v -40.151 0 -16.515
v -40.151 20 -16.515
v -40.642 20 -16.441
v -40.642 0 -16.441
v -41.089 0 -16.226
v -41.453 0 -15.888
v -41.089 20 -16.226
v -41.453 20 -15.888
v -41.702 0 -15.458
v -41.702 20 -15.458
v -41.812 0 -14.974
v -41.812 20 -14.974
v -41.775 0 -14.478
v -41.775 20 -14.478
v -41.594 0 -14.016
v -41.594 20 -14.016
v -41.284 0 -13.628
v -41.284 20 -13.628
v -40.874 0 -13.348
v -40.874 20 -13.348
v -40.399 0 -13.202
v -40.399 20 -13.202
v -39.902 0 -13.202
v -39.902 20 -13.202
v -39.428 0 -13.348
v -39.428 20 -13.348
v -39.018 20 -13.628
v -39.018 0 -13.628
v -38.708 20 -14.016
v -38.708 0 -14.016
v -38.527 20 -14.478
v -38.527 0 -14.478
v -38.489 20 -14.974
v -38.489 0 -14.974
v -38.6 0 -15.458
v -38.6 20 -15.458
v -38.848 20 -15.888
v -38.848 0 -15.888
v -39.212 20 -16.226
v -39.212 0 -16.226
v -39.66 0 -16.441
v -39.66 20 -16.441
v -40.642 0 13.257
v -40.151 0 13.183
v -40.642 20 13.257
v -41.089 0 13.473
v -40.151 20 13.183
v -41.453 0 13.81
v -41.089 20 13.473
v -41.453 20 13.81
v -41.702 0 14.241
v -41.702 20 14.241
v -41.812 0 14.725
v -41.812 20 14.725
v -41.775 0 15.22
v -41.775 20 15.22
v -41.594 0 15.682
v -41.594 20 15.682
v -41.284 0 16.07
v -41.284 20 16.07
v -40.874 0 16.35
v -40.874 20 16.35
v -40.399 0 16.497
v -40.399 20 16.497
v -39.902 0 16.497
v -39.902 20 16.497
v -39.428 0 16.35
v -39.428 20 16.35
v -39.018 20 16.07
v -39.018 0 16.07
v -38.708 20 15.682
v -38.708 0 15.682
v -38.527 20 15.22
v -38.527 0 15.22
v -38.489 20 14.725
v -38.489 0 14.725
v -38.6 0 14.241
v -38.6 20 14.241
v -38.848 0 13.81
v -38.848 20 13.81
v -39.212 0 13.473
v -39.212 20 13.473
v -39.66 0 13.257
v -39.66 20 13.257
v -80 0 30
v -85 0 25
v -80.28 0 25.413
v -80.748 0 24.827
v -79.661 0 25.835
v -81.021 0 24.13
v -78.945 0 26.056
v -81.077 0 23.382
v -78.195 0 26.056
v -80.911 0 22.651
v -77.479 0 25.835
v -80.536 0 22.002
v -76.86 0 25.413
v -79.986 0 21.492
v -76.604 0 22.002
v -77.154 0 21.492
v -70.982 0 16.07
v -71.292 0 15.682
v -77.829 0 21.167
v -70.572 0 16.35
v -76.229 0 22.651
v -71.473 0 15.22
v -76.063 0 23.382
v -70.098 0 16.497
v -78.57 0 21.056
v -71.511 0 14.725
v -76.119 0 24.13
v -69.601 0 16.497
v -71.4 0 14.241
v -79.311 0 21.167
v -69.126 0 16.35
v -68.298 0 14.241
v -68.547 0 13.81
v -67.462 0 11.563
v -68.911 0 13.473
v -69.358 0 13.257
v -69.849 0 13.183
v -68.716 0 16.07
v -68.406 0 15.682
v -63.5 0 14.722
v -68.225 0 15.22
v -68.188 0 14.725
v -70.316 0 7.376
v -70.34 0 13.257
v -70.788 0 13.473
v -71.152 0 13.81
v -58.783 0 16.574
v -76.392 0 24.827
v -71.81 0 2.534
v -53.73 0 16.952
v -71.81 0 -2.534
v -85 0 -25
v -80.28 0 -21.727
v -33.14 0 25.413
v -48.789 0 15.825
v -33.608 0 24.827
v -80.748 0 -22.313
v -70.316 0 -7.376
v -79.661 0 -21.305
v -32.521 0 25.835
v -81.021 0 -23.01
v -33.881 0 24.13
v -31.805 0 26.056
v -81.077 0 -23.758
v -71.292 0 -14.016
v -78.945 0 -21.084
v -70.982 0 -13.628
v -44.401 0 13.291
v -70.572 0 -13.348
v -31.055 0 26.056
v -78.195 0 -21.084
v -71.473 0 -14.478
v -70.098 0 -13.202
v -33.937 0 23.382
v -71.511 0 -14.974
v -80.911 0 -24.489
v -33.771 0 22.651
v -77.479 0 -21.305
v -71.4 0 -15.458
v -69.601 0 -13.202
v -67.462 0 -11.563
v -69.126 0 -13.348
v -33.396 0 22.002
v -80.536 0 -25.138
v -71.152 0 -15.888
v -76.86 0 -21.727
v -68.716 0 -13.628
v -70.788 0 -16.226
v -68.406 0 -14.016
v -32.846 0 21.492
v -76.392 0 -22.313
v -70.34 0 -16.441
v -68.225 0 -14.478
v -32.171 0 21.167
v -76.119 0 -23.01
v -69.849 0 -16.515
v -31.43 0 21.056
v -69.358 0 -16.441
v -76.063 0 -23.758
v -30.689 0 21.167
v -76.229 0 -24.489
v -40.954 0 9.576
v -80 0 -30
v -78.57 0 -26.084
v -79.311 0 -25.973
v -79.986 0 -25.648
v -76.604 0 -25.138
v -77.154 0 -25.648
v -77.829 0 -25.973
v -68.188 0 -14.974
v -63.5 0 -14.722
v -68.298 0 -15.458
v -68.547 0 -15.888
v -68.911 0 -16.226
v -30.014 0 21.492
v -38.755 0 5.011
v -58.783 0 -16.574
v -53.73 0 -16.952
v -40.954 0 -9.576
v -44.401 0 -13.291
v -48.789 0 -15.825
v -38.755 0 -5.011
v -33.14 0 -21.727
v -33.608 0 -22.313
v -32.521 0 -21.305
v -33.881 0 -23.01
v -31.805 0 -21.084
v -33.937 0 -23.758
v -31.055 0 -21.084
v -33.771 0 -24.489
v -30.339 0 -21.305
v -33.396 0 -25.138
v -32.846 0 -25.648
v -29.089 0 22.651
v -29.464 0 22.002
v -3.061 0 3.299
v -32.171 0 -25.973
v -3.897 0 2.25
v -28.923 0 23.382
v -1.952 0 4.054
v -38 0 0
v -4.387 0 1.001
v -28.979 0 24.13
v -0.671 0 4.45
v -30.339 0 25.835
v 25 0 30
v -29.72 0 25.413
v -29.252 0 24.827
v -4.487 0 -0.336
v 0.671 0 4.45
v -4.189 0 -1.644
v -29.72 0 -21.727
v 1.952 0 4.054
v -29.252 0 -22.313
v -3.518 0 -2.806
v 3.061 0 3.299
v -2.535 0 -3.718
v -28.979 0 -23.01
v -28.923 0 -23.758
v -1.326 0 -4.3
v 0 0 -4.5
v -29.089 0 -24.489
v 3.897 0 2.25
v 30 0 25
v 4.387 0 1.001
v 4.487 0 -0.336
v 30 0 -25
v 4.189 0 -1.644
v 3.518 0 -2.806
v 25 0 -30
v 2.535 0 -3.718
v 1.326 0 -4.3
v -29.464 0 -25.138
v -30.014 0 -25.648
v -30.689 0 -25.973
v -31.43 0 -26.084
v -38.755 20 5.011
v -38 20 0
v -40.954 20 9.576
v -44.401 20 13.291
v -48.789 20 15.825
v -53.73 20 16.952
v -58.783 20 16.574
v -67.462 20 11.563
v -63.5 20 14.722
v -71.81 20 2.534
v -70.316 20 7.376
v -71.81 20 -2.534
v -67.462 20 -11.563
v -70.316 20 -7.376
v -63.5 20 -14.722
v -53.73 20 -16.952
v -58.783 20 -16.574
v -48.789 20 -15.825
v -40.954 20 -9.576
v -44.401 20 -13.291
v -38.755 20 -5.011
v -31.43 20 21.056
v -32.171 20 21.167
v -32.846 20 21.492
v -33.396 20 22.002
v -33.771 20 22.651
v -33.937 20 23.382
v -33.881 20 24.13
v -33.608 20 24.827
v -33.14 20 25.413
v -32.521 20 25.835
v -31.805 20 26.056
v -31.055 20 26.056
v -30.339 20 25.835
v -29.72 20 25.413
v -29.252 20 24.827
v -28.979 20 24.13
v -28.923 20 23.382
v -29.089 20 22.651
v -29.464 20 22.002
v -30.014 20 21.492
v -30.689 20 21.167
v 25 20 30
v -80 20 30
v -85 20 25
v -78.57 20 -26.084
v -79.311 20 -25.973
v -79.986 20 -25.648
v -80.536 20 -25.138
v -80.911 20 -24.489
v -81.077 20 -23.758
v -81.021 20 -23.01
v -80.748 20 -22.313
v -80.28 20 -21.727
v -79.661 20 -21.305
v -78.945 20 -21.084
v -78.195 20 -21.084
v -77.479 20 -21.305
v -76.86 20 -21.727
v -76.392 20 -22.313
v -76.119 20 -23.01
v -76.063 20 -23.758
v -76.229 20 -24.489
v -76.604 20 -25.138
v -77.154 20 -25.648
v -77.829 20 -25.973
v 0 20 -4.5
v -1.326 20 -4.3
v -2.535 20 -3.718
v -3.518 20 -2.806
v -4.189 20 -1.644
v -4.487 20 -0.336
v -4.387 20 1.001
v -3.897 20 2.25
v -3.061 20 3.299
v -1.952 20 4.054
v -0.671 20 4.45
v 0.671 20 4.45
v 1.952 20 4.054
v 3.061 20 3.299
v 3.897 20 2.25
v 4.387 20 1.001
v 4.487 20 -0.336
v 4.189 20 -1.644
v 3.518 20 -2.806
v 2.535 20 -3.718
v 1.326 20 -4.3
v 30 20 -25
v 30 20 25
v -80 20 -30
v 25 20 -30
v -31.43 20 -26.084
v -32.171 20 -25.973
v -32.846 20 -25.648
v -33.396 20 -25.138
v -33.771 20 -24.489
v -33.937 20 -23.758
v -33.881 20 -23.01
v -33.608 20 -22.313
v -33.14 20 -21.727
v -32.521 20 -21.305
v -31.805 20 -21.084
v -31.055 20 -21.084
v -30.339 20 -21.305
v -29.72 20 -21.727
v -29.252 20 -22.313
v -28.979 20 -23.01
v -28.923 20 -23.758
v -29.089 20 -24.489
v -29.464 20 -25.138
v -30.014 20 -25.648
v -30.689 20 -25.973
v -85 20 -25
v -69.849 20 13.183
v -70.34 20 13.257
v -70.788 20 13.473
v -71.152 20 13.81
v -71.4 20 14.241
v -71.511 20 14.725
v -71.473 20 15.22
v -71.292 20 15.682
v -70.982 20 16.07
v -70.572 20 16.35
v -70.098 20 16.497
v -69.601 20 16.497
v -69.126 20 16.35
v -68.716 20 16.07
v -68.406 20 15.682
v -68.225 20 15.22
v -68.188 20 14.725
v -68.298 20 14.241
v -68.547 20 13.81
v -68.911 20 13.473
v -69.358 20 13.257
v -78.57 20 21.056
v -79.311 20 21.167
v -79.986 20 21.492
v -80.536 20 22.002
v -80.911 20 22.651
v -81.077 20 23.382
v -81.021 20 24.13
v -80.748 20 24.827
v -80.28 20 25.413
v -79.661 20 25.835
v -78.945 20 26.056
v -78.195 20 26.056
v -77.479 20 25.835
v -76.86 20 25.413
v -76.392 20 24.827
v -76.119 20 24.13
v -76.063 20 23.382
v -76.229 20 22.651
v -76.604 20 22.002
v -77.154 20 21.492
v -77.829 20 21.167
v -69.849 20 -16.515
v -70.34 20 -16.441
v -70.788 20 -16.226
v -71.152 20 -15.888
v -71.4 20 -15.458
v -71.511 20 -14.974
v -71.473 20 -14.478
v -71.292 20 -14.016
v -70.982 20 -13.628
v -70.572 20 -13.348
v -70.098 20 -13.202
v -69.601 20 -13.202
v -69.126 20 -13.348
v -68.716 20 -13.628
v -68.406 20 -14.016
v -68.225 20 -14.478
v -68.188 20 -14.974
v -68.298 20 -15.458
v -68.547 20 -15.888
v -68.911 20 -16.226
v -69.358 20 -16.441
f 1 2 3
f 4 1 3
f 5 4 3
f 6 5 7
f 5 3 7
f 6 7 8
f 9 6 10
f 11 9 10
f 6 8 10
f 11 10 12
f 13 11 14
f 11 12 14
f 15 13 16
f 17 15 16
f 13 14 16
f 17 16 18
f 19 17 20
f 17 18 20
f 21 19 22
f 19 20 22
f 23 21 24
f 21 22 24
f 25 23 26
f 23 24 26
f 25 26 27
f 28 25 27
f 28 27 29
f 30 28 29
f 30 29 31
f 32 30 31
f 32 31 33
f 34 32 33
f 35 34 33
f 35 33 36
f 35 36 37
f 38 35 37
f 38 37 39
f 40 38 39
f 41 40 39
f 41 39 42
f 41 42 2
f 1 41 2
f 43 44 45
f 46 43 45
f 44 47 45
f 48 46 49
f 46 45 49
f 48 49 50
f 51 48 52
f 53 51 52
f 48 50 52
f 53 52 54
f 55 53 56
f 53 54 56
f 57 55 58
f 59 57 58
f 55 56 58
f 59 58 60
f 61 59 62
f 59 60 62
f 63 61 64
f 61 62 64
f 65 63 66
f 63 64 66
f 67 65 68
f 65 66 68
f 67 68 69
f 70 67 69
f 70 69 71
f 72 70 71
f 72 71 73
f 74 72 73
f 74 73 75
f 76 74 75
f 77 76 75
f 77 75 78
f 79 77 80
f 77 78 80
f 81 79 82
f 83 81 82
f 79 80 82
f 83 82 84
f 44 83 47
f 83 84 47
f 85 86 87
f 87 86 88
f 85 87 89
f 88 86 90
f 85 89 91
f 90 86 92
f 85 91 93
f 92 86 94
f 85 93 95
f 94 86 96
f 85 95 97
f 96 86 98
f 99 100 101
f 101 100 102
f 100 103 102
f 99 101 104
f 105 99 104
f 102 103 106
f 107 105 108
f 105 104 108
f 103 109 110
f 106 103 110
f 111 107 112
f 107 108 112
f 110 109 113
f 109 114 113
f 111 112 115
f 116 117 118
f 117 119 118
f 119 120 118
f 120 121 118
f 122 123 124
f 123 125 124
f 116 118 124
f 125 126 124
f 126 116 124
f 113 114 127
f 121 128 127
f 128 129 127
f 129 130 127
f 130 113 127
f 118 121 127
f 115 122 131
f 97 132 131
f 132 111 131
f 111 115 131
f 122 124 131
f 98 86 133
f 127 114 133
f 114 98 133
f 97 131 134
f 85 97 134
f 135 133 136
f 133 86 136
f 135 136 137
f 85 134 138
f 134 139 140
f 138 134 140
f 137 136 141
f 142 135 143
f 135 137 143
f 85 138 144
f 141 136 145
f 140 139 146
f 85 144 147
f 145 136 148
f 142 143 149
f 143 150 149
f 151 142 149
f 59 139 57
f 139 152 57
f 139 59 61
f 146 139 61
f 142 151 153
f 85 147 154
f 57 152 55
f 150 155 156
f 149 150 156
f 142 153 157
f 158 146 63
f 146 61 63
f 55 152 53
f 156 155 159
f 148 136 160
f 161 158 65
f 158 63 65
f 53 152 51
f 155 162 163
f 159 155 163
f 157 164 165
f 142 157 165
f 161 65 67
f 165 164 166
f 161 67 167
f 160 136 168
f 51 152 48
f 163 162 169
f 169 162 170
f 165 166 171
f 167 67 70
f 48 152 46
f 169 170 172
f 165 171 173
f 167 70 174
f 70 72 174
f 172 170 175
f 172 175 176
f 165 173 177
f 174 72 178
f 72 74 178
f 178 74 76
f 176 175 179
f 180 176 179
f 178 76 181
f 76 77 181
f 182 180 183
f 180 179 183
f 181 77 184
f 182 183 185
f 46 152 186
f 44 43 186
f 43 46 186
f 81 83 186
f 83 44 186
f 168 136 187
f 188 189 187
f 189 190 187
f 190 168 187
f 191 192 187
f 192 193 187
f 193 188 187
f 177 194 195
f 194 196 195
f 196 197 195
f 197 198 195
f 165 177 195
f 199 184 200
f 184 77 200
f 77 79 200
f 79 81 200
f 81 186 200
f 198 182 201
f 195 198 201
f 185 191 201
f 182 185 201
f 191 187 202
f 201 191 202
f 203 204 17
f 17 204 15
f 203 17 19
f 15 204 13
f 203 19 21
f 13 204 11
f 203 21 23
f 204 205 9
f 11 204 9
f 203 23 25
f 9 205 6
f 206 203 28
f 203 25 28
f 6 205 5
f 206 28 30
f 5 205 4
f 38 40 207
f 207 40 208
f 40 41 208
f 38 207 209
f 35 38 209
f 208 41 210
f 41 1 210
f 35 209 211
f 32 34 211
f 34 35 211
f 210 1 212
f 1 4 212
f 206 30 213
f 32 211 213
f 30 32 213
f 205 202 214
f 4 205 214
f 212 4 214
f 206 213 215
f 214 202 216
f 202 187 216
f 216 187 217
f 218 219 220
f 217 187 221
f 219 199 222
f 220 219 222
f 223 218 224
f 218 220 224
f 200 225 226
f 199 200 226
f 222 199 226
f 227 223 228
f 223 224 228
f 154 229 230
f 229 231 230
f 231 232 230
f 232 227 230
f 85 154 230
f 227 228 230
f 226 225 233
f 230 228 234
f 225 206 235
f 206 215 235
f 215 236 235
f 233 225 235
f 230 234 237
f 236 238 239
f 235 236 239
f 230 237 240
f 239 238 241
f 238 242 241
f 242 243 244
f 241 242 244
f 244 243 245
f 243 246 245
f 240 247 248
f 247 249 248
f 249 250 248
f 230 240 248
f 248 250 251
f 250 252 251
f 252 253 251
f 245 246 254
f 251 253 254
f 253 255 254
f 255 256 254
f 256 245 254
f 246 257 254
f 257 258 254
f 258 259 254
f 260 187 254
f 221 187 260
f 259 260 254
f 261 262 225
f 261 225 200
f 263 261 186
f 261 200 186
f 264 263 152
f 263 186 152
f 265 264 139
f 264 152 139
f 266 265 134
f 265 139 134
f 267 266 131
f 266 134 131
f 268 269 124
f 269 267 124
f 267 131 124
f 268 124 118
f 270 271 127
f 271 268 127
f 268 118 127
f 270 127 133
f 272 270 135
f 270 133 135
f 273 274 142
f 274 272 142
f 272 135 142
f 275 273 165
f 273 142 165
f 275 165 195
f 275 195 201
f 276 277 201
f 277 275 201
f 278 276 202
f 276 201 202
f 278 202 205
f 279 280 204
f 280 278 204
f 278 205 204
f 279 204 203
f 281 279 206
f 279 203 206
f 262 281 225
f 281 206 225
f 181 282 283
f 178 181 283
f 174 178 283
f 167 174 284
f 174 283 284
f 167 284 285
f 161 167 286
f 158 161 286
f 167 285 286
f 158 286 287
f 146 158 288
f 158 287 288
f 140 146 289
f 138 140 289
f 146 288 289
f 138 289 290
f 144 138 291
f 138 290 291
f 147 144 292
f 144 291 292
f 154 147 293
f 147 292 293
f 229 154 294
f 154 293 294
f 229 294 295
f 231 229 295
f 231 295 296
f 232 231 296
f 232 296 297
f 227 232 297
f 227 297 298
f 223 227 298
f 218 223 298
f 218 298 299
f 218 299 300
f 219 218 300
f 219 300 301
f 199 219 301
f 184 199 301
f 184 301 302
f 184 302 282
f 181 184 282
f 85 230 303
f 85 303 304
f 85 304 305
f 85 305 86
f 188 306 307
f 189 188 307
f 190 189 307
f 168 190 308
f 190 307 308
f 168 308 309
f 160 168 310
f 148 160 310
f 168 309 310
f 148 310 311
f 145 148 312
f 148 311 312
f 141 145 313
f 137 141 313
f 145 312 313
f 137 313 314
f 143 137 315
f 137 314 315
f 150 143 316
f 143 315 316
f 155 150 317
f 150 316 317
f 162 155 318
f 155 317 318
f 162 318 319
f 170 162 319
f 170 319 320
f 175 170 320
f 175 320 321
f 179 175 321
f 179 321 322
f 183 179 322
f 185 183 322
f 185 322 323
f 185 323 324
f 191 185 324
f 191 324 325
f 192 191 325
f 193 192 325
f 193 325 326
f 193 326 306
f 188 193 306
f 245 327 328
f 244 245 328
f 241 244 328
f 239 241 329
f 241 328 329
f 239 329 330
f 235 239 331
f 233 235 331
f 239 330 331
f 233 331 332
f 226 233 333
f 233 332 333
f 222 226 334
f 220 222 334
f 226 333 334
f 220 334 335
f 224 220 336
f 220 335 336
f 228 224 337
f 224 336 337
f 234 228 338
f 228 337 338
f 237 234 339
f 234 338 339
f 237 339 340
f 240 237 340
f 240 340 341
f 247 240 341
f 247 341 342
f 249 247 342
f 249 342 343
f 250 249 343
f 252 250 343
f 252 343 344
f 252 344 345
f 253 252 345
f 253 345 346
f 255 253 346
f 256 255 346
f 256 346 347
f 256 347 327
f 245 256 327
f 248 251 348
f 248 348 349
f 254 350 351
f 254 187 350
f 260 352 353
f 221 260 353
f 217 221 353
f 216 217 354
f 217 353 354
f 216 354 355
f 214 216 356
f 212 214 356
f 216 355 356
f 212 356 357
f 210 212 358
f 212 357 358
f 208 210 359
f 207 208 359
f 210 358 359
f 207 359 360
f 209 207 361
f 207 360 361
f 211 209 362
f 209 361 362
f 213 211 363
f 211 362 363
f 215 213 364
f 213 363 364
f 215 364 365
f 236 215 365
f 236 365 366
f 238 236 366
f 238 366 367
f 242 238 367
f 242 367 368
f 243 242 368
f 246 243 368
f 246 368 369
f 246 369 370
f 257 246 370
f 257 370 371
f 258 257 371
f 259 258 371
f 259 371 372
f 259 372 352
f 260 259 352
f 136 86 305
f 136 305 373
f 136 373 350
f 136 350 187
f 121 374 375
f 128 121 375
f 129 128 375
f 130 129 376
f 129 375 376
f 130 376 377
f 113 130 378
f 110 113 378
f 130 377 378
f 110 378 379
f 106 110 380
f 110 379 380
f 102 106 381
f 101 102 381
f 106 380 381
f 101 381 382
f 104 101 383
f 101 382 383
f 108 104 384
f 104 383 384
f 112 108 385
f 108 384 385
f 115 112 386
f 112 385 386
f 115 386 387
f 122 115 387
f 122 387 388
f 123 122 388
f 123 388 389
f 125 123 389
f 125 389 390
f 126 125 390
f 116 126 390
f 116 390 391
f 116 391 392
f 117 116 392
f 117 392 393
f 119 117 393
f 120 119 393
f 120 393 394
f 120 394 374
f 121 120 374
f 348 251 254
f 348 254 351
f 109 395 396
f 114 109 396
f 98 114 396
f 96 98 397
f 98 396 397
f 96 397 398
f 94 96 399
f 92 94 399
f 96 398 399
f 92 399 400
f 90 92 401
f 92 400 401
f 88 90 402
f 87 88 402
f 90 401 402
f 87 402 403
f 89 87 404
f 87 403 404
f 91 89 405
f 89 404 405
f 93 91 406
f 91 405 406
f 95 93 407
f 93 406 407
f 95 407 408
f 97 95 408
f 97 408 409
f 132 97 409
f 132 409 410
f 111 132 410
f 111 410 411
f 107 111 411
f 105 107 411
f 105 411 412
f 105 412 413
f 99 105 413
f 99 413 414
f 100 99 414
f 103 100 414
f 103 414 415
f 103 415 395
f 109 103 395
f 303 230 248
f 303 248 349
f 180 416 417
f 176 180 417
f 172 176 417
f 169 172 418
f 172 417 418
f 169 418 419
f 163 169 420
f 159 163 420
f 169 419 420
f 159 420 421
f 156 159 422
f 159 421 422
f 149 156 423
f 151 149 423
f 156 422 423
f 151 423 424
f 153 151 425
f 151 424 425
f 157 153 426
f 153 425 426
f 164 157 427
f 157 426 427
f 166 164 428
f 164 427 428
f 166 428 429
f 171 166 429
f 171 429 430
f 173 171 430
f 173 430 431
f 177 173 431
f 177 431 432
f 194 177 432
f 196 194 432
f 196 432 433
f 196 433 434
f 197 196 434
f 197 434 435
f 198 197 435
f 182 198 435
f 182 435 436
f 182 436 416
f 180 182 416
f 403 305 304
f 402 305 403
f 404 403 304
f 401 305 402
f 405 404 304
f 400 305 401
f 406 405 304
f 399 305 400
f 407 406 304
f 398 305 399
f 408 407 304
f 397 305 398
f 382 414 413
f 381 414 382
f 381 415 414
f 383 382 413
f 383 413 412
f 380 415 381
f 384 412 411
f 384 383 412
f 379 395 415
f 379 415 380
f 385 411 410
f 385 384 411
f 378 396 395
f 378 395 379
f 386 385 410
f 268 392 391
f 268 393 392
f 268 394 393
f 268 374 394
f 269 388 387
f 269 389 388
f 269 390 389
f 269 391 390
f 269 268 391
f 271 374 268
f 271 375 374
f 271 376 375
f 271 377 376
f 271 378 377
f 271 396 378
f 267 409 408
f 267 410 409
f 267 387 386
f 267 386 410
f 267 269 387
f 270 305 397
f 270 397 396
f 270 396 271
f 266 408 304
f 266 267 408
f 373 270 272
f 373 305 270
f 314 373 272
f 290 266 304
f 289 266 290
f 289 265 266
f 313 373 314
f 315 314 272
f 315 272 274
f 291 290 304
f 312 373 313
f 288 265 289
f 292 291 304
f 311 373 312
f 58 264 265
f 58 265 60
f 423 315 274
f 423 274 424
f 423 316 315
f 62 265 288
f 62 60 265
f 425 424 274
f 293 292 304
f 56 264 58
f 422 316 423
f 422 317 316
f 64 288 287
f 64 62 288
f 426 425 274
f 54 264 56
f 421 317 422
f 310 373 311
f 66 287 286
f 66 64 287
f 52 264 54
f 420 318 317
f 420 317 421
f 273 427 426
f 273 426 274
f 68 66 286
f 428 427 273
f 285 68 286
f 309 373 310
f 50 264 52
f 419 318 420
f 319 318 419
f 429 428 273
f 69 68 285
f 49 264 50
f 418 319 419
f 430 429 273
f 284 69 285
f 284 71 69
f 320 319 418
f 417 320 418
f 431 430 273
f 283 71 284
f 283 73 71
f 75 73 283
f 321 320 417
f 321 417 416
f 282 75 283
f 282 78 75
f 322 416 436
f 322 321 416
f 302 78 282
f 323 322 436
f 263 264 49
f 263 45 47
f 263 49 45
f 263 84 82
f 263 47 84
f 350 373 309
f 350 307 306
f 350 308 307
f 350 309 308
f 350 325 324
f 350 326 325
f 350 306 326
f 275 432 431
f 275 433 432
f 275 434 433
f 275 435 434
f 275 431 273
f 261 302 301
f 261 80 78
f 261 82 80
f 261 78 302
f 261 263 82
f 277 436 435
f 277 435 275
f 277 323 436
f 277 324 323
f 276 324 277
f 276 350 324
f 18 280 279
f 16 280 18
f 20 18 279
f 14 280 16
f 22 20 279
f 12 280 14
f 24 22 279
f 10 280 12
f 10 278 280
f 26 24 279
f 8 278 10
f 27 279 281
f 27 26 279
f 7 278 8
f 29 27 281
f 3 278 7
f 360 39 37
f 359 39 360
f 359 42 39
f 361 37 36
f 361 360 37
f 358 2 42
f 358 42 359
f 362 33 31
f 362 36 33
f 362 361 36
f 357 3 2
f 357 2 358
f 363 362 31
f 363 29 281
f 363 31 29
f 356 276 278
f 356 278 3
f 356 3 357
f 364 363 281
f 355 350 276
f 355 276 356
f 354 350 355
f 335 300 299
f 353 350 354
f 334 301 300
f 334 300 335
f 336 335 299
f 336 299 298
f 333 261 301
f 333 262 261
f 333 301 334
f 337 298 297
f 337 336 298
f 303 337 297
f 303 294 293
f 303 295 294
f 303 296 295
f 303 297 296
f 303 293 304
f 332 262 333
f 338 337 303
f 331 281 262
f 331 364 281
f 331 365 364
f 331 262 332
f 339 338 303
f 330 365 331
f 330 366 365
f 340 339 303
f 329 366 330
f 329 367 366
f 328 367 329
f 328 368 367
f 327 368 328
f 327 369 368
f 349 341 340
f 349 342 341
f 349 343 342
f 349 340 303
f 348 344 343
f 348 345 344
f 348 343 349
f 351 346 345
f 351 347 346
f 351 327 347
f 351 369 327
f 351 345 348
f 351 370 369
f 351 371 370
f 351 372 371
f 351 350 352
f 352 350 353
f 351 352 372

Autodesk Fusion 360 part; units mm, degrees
sketch "Sketch1" plane through (0, 0, 0) normal (0, 1, 0) x (1, 0, 0)
  circle A0 centre (-55, 0) radius 17
  line L0 (-78.57, 23.57) -> (-31.43, 23.57) construction
  line L1 (-31.43, 23.57) -> (-31.43, -23.57) construction
  line L2 (-31.43, -23.57) -> (-78.57, -23.57) construction
  line L3 (-78.57, -23.57) -> (-78.57, 23.57) construction
  line L4 (-78.57, -23.57) -> (-31.43, 23.57) construction
  line L5 (-85, 30) -> (30, 30)
  line L6 (30, 30) -> (30, -30)
  line L7 (30, -30) -> (-85, -30)
  line L8 (-85, -30) -> (-85, 30)
  line L9 (0, 0) -> (-55, 0) construction
  circle A1 centre (-55, 0) radius 21 construction
  line L10 (-78.57, 23.57) -> (-31.43, -23.57) construction
  line L11 (-55, 23.57) -> (-55, -23.57) construction
  line L12 (-78.57, 0) -> (-31.43, 0) construction
  point P0 (-55, 21)
  point P1 (-69.8492, 14.8492)
  point P2 (-76, 0)
  point P3 (-69.8492, -14.8492)
  point P4 (-55, -21)
  point P5 (-40.1508, -14.8492)
  point P6 (-40.1508, 14.8492)
  point P7 (-34, 0)
  dimension "d2" = 34
  dimension "d3" = 55
  dimension "d4" = 47.14
  dimension "d5" = 30
  dimension "d6" = 30
  dimension "d7" = 60
  dimension "d20" = 42
extrude "Extrude1" add sketch "Sketch1" along normal blind 20
hole "Hole1" at (0, 0, 0) direction (0, 1, 0) diameter 9 end through all
hole "Hole2" at (-31.43, 0, 23.57) at (-31.43, 0, -23.57) at (-78.57, 0, -23.57) at (-78.57, 0, 23.57) direction (0, 1, 0) diameter 5.029 end through all
hole "Hole3" at (-69.8492, 0, 14.8492) at (-69.8492, 0, -14.8492) at (-40.1508, 0, -14.8492) at (-40.1508, 0, 14.8492) direction (0, 1, 0) diameter 3.332 end through all
chamfer "Chamfer3" distance 5 angle 45 4 edges at (-85, 10, 30) (-85, 10, -30) (30, 10, 30) (30, 10, -30)
